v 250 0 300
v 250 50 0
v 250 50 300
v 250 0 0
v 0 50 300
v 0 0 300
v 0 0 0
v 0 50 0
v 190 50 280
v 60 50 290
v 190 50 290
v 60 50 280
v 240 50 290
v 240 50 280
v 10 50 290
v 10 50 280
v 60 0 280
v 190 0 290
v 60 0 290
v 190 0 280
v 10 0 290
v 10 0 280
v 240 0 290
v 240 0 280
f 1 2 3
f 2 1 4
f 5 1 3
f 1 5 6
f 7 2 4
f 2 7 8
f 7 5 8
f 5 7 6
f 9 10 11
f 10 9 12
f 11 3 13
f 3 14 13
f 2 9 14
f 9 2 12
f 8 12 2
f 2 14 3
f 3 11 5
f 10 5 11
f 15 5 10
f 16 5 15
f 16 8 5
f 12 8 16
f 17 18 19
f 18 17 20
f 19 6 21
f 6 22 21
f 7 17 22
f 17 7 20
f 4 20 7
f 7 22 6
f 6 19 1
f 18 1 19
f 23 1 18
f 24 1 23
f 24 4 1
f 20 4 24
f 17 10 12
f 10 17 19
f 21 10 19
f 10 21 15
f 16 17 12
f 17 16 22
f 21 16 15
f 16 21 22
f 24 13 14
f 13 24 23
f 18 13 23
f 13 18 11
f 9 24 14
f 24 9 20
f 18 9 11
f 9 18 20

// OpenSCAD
/*
  Designed for the same idiots that require plastic pistols
	Use at your own risk author doesnt care if you harm yourself
	
	Usage

		1. Print two panals.
		2. Cut 2 lenghts of string at about 300mm.
		3. Tie one end of the string to each hole on both panels.
		4. Repeat step 3 on the other sides of both panels.
		5. Throw vest over shoulders.
		6. Prepare to die.
*/

difference(){
	cube([250,50,300]);
	translate([10,0,280])cube([50,50,10]);
	translate([190,0,280])cube([50,50,10]);
};
